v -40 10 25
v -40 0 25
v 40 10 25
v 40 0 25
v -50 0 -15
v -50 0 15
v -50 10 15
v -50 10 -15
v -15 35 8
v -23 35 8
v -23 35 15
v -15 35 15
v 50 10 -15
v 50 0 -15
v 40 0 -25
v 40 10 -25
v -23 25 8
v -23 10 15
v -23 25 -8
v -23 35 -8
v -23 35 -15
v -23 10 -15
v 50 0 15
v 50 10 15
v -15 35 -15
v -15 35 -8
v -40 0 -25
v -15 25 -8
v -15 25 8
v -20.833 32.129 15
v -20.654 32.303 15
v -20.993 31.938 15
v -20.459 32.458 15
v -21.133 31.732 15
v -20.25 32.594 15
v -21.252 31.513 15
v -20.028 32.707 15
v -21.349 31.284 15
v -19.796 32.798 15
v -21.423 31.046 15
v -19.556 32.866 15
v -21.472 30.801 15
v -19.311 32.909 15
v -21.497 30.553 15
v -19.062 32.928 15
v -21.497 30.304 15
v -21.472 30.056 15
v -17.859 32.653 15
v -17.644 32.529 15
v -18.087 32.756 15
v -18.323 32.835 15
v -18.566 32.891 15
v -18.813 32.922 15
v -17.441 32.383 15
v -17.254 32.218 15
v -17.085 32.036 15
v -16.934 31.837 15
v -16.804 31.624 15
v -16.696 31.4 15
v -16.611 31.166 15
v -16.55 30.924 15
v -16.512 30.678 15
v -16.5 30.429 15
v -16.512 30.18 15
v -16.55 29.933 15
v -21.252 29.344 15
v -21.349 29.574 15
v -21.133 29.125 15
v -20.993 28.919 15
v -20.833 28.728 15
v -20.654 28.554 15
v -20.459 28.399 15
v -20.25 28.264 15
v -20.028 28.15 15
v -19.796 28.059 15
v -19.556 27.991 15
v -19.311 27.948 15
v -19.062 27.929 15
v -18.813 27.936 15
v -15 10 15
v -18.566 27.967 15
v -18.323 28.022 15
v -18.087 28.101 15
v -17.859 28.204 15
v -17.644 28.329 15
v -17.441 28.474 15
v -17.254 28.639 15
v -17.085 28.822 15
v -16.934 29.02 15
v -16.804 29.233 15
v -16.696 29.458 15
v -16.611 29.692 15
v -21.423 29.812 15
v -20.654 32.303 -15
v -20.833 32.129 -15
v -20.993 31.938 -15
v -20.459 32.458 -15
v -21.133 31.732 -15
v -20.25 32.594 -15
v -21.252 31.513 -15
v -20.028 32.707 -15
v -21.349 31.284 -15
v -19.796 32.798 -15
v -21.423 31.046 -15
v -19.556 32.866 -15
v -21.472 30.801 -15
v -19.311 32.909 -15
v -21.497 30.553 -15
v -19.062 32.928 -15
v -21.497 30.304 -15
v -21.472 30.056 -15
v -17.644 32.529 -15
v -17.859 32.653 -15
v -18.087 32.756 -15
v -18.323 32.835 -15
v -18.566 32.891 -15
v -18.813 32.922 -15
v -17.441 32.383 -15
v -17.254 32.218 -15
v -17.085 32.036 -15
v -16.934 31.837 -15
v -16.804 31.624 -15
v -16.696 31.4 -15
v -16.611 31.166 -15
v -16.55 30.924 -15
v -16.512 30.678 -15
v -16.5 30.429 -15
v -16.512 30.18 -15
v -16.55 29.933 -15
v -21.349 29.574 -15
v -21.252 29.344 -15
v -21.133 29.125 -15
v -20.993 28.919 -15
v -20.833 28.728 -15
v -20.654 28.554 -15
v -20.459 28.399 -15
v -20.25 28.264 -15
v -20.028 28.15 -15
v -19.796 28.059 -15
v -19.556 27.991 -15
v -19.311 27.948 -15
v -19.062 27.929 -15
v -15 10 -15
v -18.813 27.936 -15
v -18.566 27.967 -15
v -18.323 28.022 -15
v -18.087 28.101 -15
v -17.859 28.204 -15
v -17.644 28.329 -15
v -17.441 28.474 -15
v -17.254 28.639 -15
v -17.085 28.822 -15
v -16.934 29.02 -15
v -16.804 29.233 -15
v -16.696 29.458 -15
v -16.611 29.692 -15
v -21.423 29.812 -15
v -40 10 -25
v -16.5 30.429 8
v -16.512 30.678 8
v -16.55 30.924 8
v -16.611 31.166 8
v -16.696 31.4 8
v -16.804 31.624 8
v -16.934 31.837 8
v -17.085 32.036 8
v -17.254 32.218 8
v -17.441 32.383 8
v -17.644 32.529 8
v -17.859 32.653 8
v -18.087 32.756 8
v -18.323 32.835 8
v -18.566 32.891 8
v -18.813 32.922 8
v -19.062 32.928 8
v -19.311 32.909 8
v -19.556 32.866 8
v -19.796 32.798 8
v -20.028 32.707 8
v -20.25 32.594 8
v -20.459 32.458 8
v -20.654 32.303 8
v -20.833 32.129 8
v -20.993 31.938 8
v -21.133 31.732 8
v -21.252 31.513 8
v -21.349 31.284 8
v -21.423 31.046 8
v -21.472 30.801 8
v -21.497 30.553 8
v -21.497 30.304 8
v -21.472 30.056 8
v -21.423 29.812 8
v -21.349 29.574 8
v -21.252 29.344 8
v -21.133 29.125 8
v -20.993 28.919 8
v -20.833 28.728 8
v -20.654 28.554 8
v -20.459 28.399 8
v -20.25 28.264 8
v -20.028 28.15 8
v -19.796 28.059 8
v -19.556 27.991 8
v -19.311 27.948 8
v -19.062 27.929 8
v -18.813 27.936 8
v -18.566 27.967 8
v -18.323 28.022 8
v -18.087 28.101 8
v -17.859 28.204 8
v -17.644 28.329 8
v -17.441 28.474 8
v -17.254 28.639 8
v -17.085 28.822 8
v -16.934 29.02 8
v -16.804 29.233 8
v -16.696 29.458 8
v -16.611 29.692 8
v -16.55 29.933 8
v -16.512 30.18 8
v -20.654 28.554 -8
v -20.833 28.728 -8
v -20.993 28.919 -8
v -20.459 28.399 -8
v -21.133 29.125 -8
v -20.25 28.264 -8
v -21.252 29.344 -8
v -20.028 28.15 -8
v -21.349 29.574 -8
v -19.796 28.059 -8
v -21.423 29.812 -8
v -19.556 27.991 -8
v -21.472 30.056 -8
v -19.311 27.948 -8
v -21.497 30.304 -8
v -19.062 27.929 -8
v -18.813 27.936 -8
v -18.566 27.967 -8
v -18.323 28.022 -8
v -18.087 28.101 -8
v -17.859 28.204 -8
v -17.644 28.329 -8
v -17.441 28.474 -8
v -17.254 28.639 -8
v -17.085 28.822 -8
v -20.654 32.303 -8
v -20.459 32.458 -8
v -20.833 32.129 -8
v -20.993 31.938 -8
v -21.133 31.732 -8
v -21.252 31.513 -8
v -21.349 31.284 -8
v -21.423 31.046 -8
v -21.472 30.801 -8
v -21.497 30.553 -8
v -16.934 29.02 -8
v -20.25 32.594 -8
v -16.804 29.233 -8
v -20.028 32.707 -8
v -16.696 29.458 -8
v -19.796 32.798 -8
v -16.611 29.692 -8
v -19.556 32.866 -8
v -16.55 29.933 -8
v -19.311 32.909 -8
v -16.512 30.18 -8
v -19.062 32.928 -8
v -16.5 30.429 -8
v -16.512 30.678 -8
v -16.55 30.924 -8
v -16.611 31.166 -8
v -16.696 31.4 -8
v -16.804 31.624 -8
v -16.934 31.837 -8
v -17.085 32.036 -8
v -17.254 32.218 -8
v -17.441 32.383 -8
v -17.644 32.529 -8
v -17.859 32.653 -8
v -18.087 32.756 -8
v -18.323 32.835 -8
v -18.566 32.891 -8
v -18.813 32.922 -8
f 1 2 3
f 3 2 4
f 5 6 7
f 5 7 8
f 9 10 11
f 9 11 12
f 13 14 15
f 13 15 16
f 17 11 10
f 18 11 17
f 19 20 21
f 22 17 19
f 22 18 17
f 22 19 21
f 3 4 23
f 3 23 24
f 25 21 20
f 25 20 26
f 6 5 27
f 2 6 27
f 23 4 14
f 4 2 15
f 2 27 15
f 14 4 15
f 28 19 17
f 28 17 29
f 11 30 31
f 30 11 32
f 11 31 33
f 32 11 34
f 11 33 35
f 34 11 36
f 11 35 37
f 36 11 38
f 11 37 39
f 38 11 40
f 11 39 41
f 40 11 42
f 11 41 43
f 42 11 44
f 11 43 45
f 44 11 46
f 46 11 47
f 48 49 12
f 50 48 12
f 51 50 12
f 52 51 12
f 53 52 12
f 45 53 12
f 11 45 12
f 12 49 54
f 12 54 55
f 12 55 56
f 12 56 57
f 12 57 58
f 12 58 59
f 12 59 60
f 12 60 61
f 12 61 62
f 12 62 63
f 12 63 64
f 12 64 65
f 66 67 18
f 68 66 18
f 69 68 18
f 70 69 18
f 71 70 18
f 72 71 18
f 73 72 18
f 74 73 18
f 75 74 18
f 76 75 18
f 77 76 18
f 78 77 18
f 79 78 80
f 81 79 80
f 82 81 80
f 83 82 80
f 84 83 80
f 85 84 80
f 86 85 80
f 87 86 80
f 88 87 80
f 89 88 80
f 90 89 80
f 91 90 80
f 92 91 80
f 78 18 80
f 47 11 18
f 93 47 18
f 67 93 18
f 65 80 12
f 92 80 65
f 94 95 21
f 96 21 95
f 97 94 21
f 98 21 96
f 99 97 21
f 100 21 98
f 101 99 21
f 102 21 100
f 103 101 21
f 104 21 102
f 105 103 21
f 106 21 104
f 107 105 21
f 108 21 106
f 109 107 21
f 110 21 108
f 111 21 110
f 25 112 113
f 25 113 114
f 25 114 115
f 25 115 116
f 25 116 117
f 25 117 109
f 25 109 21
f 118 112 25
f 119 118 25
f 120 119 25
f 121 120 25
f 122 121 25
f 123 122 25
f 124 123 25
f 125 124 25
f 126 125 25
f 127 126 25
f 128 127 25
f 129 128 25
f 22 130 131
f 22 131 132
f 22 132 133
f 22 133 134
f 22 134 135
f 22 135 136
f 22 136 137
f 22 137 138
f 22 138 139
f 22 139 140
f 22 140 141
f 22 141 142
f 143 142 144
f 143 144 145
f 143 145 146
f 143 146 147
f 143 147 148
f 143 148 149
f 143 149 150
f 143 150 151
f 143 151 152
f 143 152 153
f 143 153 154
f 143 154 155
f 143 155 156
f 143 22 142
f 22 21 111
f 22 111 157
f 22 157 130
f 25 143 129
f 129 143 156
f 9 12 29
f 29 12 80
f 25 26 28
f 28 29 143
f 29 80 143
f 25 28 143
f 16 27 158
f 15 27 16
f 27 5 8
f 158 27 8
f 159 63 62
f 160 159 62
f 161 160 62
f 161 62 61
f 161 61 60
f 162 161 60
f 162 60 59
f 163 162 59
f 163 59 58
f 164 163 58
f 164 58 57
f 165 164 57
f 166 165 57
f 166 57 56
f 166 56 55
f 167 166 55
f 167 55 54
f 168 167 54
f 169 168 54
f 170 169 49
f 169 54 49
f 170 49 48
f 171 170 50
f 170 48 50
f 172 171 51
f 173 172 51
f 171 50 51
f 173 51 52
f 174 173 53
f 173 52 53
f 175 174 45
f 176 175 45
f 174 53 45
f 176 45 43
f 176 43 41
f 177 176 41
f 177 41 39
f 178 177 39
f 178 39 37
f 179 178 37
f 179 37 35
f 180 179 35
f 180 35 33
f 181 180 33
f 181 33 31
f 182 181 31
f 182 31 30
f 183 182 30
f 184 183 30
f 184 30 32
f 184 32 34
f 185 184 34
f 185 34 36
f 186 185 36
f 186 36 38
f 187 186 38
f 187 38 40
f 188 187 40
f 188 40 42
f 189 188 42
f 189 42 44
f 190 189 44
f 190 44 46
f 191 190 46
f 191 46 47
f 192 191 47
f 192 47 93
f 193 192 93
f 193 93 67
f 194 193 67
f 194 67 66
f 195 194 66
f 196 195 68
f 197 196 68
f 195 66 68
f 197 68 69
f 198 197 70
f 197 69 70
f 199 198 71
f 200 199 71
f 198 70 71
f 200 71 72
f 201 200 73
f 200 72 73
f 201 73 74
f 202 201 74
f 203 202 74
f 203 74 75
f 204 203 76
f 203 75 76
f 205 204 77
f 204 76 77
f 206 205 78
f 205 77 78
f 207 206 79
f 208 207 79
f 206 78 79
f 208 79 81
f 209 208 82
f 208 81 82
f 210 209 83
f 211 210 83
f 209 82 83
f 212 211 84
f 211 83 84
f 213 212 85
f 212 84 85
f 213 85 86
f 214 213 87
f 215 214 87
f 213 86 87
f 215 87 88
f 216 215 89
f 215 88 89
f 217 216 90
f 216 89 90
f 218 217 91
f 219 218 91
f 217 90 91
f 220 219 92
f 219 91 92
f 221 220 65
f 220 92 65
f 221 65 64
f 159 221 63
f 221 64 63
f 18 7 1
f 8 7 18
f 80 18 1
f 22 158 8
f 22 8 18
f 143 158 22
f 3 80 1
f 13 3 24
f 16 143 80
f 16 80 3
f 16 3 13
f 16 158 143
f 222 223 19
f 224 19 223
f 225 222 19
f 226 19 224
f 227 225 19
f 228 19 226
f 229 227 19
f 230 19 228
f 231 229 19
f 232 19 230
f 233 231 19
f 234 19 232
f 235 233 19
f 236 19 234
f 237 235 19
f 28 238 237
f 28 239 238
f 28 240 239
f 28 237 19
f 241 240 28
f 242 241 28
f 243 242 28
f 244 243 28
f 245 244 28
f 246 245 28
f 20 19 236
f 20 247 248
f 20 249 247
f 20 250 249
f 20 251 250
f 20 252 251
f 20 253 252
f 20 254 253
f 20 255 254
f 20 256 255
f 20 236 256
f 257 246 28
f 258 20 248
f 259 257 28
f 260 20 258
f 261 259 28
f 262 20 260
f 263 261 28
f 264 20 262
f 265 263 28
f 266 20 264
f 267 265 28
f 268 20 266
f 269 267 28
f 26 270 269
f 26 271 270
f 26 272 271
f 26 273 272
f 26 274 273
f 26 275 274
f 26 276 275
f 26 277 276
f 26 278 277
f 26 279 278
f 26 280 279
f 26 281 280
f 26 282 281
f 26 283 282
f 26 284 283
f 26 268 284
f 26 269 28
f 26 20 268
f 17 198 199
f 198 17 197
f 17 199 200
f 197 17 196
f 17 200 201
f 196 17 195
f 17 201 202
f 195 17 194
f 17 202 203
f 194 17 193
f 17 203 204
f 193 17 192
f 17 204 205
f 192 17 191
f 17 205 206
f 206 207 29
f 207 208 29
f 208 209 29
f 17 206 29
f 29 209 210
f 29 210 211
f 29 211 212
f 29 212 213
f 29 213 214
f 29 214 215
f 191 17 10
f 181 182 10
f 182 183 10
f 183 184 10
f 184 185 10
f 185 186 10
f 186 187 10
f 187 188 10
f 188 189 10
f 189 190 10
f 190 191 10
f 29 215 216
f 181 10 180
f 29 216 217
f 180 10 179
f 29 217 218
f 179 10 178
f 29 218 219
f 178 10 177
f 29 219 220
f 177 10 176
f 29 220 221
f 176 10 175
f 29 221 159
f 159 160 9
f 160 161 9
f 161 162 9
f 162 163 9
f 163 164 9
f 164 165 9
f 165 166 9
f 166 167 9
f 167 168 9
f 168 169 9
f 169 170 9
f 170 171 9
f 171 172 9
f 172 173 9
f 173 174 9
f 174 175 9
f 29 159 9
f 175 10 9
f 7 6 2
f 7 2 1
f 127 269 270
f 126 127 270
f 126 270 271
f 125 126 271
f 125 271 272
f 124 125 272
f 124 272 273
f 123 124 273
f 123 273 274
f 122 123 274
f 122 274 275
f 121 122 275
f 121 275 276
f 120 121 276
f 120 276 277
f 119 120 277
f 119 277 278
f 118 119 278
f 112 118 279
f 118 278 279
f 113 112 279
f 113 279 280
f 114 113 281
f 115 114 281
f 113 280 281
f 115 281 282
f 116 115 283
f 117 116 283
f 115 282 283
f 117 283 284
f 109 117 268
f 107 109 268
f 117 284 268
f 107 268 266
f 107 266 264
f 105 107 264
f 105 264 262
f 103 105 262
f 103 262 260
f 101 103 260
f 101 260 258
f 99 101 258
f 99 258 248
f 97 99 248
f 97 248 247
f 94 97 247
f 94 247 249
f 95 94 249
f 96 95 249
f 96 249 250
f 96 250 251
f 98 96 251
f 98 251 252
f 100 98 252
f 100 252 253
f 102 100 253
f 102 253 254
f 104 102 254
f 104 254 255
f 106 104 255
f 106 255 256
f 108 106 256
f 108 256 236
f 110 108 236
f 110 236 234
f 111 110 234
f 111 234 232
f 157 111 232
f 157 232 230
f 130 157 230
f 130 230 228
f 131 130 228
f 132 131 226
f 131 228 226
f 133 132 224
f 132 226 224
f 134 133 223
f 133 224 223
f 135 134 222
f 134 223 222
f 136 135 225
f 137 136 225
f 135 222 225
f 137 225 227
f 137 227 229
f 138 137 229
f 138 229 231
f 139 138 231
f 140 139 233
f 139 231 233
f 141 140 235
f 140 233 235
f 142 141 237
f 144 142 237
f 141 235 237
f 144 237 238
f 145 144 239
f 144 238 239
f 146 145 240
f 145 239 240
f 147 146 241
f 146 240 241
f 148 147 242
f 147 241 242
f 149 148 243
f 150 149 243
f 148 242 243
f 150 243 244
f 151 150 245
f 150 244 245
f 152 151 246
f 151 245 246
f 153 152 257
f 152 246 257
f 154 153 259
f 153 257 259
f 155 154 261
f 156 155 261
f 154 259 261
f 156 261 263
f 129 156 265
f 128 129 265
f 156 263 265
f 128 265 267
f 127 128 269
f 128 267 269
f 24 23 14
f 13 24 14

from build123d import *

# Parameters (mm, degrees)
SKETCH1_W           = 100
SKETCH1_H           = 50
BOSS_EXTRUDE1_DEPTH = 10
CHAMFER1_SIZE       = 10
SKETCH2_W           = 8
SKETCH2_H           = 30
BOSS_EXTRUDE2_DEPTH = 25
SKETCH3_W           = 24.32534271
SKETCH3_H           = 16
CUT_EXTRUDE1_DEPTH  = 10
SKETCH4_R           = 2.5
CUT_EXTRUDE2_DEPTH  = 42


with BuildPart() as part:
    # Sketch1 → Boss-Extrude1 (new body)
    with BuildSketch(Plane(origin=(0, 0, 0), x_dir=(1, 0, 0), z_dir=(0, 1, 0))):
        Rectangle(SKETCH1_W, SKETCH1_H)
    extrude(amount=BOSS_EXTRUDE1_DEPTH)

    # Chamfer1
    chamfer1_edges = [part.edges().sort_by_distance(p)[0] for p in [
        (-50, 5, -25),
        (50, 5, -25),
        (50, 5, 25),
        (-50, 5, 25),
    ]]
    chamfer(chamfer1_edges, length=CHAMFER1_SIZE)

    # Sketch2 → Boss-Extrude2 (add)
    with BuildSketch(Plane(origin=(0, 10, 0), x_dir=(1, 0, 0), z_dir=(0, 1, 0))):
        with Locations((-19, 0)):
            Rectangle(SKETCH2_W, SKETCH2_H)
    extrude(amount=BOSS_EXTRUDE2_DEPTH)

    # Sketch3 → Cut-Extrude1 (cut)
    with BuildSketch(Plane(origin=(0, 35, 0), x_dir=(1, 0, 0), z_dir=(0, 1, 0))):
        with Locations((-18.085363493, 0)):
            Rectangle(SKETCH3_W, SKETCH3_H)
    extrude(amount=-CUT_EXTRUDE1_DEPTH, mode=Mode.SUBTRACT)

    # Sketch4 → Cut-Extrude2 (cut)
    with BuildSketch(Plane.XY.offset(15)):
        with Locations((-19, 30.428638458)):
            Circle(SKETCH4_R)
    extrude(amount=-CUT_EXTRUDE2_DEPTH, mode=Mode.SUBTRACT)


solid = part.part
